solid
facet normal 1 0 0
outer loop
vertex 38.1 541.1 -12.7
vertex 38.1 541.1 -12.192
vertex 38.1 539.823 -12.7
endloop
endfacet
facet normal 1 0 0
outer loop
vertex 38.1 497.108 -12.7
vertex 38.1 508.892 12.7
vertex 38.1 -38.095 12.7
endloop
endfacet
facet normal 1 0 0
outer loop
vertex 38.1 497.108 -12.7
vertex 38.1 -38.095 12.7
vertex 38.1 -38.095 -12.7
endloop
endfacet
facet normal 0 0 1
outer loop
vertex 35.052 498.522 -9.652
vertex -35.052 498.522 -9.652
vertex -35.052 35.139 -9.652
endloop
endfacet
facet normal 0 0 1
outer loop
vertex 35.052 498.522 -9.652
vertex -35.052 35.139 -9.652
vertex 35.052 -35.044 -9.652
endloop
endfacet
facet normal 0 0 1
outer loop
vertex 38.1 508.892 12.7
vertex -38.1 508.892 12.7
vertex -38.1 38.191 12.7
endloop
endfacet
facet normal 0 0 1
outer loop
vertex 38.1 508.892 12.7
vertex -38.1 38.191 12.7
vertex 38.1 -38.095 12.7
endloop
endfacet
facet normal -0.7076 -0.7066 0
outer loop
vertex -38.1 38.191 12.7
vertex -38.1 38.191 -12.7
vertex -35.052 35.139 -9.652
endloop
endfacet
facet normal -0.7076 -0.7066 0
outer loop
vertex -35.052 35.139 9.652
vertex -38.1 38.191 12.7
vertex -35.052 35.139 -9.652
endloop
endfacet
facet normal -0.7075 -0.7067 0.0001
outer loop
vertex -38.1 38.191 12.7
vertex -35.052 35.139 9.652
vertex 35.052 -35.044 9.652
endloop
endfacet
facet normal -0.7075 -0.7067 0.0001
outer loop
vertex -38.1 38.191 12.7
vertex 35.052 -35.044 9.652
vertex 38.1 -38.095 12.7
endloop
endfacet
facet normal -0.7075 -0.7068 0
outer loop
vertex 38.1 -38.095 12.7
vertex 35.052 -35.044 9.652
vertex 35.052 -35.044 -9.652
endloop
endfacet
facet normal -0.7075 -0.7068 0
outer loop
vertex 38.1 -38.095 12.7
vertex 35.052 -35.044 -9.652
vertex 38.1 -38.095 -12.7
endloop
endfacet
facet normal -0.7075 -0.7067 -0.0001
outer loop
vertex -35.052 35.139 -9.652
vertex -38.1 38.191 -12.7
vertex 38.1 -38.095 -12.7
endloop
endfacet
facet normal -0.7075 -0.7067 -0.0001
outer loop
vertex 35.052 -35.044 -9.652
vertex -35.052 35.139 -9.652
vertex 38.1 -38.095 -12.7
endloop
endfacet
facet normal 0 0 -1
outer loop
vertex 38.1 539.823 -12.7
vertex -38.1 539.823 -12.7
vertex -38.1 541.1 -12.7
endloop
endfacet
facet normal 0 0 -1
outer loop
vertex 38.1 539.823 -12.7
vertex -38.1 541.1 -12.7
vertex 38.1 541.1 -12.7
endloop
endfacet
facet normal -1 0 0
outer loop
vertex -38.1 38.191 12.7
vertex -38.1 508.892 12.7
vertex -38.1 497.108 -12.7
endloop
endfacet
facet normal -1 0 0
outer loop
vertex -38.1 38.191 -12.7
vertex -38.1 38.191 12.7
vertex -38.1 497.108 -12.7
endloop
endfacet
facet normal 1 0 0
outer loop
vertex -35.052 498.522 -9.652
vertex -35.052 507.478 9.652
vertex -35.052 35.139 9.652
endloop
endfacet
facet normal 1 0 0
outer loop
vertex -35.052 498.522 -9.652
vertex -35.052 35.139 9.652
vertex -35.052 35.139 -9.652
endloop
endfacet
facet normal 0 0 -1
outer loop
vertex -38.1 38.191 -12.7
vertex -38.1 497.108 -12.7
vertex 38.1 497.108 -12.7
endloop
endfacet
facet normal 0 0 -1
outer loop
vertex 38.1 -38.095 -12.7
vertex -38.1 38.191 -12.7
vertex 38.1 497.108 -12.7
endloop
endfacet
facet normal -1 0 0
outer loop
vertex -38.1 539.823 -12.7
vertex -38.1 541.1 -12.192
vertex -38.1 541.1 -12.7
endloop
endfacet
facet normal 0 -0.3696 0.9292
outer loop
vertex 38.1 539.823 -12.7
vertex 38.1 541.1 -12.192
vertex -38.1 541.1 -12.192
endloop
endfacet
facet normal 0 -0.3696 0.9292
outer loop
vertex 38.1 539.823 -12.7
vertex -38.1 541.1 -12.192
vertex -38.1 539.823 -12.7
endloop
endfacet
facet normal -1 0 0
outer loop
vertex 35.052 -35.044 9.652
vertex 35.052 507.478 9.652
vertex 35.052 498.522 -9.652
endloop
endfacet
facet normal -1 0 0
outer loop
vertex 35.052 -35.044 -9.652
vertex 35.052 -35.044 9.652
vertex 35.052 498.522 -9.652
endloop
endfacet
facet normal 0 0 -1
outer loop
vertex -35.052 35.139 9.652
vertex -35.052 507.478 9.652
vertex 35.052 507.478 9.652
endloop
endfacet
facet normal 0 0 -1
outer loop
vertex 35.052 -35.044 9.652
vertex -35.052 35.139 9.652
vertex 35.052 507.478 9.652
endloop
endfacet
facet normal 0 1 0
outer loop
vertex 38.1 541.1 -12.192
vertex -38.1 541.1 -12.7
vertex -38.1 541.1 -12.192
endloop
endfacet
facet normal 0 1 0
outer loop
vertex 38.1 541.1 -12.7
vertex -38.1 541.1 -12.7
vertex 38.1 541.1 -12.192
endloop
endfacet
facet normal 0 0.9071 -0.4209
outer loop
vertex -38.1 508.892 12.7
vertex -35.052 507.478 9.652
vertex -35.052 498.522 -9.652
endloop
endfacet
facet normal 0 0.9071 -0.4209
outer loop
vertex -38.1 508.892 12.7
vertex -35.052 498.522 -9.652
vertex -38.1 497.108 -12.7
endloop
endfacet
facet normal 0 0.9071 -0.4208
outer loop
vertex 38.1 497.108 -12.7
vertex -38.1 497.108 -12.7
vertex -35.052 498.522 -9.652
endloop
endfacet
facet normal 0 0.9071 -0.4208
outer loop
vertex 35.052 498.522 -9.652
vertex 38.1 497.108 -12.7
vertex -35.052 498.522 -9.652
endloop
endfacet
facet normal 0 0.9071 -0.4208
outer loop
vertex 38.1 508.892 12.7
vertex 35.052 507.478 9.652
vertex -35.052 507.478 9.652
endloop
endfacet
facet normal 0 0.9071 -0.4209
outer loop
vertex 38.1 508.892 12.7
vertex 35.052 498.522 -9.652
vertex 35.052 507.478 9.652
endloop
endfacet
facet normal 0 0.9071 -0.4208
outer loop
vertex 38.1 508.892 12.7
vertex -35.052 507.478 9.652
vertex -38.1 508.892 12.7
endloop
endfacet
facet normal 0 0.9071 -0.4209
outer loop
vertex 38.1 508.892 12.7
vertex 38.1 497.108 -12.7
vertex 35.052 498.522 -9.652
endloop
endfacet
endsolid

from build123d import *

# Parameters (mm, degrees)
SKETCH1_W               = 76.2
SKETCH1_H               = 25.4
SKETCH1_W_2             = 70.104
SKETCH1_H_2             = 19.304
BOSS_EXTRUDE1_DEPTH     = 503
SKETCH3_W               = 76.2
SKETCH3_H               = 25.4
SKETCH3_W_2             = 70.104
SKETCH3_H_2             = 19.304
BOSS_EXTRUDE2_DEPTH     = 38.1
SKETCH4_W               = 76.2
SKETCH4_H               = 25.4
SKETCH4_W_2             = 70.104
SKETCH4_H_2             = 19.304
BOSS_EXTRUDE3_DEPTH     = 38.1
CUT_EXTRUDE1_DEPTH      = 13.7
CUT_EXTRUDE1_DEPTH_BACK = 13.7
CUT_EXTRUDE2_DEPTH      = 77.2


with BuildPart() as part:
    # Sketch1 → Boss-Extrude1 (new body)
    with BuildSketch(Plane(origin=(0, 0, 0), x_dir=(1, 0, 0), z_dir=(0, 1, 0))):
        Rectangle(SKETCH1_W, SKETCH1_H)
        Rectangle(SKETCH1_W_2, SKETCH1_H_2, mode=Mode.SUBTRACT)
    extrude(amount=BOSS_EXTRUDE1_DEPTH)

    # Sketch3 → Boss-Extrude2 (add)
    with BuildSketch(Plane.XZ):
        Rectangle(SKETCH3_W, SKETCH3_H)
        Rectangle(SKETCH3_W_2, SKETCH3_H_2, mode=Mode.SUBTRACT)
    extrude(amount=BOSS_EXTRUDE2_DEPTH)

    # Sketch4 → Boss-Extrude3 (add)
    with BuildSketch(Plane(origin=(0, 503, 0), x_dir=(1, 0, 0), z_dir=(0, 1, 0))):
        Rectangle(SKETCH4_W, SKETCH4_H)
        Rectangle(SKETCH4_W_2, SKETCH4_H_2, mode=Mode.SUBTRACT)
    extrude(amount=BOSS_EXTRUDE3_DEPTH)

    # Sketch5 → Cut-Extrude1 (cut, two sides)
    with BuildSketch(Plane.XY) as cut_extrude1_sk:
        Polygon((-63.704425498, 63.824156123), (106.559138903, -106.632014079), (-66.404910458, -106.632014079), align=None)
    extrude(amount=CUT_EXTRUDE1_DEPTH, mode=Mode.SUBTRACT)
    extrude(cut_extrude1_sk.sketch, amount=-CUT_EXTRUDE1_DEPTH_BACK, mode=Mode.SUBTRACT)

    # Sketch6 → Cut-Extrude2 (cut, through all)
    with BuildSketch(Plane(origin=(38.1, 0, 0), x_dir=(0, 0, -1), z_dir=(1, 0, 0))):
        Polygon((33.51840798, 487.450611994), (-43.414005654, 523.140014383), (0, 598.23299359), (10.634909231, 545.017601807), align=None)
    extrude(amount=-CUT_EXTRUDE2_DEPTH, mode=Mode.SUBTRACT)


solid = part.part
